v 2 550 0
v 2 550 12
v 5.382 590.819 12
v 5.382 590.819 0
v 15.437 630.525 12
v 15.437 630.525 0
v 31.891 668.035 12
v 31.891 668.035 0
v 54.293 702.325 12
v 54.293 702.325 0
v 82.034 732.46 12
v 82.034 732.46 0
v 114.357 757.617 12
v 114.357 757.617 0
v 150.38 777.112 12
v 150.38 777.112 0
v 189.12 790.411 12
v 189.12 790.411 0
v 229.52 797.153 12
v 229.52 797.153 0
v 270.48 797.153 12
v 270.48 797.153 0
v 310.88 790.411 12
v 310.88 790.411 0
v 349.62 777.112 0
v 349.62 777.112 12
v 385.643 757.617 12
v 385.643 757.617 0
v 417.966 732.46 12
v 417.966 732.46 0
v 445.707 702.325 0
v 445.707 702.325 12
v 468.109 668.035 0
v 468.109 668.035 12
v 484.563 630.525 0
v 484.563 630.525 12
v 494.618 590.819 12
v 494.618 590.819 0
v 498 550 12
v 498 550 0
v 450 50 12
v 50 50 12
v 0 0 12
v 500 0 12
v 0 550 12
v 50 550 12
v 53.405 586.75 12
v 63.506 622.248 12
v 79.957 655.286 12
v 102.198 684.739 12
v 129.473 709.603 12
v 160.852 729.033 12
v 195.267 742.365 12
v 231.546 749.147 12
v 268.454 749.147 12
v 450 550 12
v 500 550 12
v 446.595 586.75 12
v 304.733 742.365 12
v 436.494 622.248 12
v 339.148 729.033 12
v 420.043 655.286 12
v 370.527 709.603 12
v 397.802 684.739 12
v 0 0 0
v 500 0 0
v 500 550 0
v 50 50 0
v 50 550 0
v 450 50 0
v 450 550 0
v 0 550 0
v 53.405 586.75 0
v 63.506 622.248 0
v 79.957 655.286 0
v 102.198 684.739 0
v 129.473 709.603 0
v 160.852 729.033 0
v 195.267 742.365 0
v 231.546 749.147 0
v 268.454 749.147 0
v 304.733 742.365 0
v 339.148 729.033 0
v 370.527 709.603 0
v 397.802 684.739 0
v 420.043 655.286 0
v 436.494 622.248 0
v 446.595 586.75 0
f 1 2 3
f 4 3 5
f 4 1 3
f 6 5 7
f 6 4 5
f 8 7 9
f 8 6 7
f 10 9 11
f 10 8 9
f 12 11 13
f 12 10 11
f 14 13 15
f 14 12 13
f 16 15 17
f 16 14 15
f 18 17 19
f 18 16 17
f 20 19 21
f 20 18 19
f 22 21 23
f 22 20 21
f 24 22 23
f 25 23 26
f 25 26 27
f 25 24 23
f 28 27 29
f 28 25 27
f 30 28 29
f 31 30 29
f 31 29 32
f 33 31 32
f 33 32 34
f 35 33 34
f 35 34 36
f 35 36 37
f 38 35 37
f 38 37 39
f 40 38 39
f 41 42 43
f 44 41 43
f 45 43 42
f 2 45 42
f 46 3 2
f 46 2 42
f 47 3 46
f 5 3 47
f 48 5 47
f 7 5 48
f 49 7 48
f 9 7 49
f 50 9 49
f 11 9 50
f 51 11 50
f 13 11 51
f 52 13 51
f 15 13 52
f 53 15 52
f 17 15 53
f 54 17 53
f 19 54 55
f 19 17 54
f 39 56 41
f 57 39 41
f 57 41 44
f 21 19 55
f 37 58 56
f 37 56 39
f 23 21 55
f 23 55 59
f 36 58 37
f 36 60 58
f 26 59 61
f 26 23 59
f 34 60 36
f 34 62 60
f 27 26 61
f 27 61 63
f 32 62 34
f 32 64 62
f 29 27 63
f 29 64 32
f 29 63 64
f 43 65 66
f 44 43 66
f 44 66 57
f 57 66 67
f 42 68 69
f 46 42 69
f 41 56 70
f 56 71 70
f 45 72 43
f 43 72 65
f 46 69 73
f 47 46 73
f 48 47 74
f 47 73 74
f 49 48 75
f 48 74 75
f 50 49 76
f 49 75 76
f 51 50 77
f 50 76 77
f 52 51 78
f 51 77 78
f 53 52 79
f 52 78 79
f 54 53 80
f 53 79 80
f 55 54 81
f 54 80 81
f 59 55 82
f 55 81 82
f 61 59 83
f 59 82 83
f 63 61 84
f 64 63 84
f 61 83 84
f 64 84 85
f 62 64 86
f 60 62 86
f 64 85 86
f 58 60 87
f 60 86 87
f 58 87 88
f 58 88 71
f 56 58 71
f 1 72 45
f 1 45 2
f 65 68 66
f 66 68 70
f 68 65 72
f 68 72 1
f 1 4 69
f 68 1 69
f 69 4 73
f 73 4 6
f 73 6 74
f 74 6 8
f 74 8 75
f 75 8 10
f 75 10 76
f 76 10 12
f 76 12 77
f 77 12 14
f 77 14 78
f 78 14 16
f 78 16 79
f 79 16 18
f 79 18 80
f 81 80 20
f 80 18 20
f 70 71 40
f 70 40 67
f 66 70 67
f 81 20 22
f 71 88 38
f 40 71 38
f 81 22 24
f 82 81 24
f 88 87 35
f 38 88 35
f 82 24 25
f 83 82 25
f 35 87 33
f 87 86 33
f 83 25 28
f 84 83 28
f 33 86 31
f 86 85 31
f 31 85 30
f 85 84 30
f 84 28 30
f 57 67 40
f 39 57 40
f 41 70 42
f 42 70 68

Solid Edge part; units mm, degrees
sketch "Sketch1" plane through (0, 0, 0) normal (0, 0, 1) x (1, 0, 0)
  line L0 (0, 0) -> (500, 0)
  line L1 (500, 0) -> (500, 550)
  arc A0 (0, 550) -> (500, 550) centre (250, 550) cw
  line L2 (0, 550) -> (0, 0)
  dimension "D1" = 550
  dimension "D2" = 500
extrude "Protrusion1" add sketch "Sketch1" along normal blind 12
sketch "Sketch2" plane through (250, 400, 0) normal (0, 0, -1) x (-1, 0, 0)
  line L0 (250, 150) -> (248, 150)
  arc A0 (-248, 150) -> (248, 150) centre (0, 150) cw
  line L1 (-250, 150) -> (-248, 150)
  arc A1 (250, 150) -> (-250, 150) centre (0, 150) ccw
extrude "Ausschnitt_6" cut sketch "Sketch2" against normal blind 184.2167
sketch "Sketch3" plane through (250, 399, 0) normal (0, 0, -1) x (-1, 0, 0)
  line L0 (-200, -349) -> (200, -349)
  line L1 (200, -349) -> (200, 151)
  arc A0 (-200, 151) -> (200, 151) centre (0, 151) cw
  line L2 (-200, 151) -> (-200, -349)
  dimension "D1" = 200
  dimension "D2" = 200
extrude "Ausschnitt_7" cut sketch "Sketch3" against normal blind 568.3558
